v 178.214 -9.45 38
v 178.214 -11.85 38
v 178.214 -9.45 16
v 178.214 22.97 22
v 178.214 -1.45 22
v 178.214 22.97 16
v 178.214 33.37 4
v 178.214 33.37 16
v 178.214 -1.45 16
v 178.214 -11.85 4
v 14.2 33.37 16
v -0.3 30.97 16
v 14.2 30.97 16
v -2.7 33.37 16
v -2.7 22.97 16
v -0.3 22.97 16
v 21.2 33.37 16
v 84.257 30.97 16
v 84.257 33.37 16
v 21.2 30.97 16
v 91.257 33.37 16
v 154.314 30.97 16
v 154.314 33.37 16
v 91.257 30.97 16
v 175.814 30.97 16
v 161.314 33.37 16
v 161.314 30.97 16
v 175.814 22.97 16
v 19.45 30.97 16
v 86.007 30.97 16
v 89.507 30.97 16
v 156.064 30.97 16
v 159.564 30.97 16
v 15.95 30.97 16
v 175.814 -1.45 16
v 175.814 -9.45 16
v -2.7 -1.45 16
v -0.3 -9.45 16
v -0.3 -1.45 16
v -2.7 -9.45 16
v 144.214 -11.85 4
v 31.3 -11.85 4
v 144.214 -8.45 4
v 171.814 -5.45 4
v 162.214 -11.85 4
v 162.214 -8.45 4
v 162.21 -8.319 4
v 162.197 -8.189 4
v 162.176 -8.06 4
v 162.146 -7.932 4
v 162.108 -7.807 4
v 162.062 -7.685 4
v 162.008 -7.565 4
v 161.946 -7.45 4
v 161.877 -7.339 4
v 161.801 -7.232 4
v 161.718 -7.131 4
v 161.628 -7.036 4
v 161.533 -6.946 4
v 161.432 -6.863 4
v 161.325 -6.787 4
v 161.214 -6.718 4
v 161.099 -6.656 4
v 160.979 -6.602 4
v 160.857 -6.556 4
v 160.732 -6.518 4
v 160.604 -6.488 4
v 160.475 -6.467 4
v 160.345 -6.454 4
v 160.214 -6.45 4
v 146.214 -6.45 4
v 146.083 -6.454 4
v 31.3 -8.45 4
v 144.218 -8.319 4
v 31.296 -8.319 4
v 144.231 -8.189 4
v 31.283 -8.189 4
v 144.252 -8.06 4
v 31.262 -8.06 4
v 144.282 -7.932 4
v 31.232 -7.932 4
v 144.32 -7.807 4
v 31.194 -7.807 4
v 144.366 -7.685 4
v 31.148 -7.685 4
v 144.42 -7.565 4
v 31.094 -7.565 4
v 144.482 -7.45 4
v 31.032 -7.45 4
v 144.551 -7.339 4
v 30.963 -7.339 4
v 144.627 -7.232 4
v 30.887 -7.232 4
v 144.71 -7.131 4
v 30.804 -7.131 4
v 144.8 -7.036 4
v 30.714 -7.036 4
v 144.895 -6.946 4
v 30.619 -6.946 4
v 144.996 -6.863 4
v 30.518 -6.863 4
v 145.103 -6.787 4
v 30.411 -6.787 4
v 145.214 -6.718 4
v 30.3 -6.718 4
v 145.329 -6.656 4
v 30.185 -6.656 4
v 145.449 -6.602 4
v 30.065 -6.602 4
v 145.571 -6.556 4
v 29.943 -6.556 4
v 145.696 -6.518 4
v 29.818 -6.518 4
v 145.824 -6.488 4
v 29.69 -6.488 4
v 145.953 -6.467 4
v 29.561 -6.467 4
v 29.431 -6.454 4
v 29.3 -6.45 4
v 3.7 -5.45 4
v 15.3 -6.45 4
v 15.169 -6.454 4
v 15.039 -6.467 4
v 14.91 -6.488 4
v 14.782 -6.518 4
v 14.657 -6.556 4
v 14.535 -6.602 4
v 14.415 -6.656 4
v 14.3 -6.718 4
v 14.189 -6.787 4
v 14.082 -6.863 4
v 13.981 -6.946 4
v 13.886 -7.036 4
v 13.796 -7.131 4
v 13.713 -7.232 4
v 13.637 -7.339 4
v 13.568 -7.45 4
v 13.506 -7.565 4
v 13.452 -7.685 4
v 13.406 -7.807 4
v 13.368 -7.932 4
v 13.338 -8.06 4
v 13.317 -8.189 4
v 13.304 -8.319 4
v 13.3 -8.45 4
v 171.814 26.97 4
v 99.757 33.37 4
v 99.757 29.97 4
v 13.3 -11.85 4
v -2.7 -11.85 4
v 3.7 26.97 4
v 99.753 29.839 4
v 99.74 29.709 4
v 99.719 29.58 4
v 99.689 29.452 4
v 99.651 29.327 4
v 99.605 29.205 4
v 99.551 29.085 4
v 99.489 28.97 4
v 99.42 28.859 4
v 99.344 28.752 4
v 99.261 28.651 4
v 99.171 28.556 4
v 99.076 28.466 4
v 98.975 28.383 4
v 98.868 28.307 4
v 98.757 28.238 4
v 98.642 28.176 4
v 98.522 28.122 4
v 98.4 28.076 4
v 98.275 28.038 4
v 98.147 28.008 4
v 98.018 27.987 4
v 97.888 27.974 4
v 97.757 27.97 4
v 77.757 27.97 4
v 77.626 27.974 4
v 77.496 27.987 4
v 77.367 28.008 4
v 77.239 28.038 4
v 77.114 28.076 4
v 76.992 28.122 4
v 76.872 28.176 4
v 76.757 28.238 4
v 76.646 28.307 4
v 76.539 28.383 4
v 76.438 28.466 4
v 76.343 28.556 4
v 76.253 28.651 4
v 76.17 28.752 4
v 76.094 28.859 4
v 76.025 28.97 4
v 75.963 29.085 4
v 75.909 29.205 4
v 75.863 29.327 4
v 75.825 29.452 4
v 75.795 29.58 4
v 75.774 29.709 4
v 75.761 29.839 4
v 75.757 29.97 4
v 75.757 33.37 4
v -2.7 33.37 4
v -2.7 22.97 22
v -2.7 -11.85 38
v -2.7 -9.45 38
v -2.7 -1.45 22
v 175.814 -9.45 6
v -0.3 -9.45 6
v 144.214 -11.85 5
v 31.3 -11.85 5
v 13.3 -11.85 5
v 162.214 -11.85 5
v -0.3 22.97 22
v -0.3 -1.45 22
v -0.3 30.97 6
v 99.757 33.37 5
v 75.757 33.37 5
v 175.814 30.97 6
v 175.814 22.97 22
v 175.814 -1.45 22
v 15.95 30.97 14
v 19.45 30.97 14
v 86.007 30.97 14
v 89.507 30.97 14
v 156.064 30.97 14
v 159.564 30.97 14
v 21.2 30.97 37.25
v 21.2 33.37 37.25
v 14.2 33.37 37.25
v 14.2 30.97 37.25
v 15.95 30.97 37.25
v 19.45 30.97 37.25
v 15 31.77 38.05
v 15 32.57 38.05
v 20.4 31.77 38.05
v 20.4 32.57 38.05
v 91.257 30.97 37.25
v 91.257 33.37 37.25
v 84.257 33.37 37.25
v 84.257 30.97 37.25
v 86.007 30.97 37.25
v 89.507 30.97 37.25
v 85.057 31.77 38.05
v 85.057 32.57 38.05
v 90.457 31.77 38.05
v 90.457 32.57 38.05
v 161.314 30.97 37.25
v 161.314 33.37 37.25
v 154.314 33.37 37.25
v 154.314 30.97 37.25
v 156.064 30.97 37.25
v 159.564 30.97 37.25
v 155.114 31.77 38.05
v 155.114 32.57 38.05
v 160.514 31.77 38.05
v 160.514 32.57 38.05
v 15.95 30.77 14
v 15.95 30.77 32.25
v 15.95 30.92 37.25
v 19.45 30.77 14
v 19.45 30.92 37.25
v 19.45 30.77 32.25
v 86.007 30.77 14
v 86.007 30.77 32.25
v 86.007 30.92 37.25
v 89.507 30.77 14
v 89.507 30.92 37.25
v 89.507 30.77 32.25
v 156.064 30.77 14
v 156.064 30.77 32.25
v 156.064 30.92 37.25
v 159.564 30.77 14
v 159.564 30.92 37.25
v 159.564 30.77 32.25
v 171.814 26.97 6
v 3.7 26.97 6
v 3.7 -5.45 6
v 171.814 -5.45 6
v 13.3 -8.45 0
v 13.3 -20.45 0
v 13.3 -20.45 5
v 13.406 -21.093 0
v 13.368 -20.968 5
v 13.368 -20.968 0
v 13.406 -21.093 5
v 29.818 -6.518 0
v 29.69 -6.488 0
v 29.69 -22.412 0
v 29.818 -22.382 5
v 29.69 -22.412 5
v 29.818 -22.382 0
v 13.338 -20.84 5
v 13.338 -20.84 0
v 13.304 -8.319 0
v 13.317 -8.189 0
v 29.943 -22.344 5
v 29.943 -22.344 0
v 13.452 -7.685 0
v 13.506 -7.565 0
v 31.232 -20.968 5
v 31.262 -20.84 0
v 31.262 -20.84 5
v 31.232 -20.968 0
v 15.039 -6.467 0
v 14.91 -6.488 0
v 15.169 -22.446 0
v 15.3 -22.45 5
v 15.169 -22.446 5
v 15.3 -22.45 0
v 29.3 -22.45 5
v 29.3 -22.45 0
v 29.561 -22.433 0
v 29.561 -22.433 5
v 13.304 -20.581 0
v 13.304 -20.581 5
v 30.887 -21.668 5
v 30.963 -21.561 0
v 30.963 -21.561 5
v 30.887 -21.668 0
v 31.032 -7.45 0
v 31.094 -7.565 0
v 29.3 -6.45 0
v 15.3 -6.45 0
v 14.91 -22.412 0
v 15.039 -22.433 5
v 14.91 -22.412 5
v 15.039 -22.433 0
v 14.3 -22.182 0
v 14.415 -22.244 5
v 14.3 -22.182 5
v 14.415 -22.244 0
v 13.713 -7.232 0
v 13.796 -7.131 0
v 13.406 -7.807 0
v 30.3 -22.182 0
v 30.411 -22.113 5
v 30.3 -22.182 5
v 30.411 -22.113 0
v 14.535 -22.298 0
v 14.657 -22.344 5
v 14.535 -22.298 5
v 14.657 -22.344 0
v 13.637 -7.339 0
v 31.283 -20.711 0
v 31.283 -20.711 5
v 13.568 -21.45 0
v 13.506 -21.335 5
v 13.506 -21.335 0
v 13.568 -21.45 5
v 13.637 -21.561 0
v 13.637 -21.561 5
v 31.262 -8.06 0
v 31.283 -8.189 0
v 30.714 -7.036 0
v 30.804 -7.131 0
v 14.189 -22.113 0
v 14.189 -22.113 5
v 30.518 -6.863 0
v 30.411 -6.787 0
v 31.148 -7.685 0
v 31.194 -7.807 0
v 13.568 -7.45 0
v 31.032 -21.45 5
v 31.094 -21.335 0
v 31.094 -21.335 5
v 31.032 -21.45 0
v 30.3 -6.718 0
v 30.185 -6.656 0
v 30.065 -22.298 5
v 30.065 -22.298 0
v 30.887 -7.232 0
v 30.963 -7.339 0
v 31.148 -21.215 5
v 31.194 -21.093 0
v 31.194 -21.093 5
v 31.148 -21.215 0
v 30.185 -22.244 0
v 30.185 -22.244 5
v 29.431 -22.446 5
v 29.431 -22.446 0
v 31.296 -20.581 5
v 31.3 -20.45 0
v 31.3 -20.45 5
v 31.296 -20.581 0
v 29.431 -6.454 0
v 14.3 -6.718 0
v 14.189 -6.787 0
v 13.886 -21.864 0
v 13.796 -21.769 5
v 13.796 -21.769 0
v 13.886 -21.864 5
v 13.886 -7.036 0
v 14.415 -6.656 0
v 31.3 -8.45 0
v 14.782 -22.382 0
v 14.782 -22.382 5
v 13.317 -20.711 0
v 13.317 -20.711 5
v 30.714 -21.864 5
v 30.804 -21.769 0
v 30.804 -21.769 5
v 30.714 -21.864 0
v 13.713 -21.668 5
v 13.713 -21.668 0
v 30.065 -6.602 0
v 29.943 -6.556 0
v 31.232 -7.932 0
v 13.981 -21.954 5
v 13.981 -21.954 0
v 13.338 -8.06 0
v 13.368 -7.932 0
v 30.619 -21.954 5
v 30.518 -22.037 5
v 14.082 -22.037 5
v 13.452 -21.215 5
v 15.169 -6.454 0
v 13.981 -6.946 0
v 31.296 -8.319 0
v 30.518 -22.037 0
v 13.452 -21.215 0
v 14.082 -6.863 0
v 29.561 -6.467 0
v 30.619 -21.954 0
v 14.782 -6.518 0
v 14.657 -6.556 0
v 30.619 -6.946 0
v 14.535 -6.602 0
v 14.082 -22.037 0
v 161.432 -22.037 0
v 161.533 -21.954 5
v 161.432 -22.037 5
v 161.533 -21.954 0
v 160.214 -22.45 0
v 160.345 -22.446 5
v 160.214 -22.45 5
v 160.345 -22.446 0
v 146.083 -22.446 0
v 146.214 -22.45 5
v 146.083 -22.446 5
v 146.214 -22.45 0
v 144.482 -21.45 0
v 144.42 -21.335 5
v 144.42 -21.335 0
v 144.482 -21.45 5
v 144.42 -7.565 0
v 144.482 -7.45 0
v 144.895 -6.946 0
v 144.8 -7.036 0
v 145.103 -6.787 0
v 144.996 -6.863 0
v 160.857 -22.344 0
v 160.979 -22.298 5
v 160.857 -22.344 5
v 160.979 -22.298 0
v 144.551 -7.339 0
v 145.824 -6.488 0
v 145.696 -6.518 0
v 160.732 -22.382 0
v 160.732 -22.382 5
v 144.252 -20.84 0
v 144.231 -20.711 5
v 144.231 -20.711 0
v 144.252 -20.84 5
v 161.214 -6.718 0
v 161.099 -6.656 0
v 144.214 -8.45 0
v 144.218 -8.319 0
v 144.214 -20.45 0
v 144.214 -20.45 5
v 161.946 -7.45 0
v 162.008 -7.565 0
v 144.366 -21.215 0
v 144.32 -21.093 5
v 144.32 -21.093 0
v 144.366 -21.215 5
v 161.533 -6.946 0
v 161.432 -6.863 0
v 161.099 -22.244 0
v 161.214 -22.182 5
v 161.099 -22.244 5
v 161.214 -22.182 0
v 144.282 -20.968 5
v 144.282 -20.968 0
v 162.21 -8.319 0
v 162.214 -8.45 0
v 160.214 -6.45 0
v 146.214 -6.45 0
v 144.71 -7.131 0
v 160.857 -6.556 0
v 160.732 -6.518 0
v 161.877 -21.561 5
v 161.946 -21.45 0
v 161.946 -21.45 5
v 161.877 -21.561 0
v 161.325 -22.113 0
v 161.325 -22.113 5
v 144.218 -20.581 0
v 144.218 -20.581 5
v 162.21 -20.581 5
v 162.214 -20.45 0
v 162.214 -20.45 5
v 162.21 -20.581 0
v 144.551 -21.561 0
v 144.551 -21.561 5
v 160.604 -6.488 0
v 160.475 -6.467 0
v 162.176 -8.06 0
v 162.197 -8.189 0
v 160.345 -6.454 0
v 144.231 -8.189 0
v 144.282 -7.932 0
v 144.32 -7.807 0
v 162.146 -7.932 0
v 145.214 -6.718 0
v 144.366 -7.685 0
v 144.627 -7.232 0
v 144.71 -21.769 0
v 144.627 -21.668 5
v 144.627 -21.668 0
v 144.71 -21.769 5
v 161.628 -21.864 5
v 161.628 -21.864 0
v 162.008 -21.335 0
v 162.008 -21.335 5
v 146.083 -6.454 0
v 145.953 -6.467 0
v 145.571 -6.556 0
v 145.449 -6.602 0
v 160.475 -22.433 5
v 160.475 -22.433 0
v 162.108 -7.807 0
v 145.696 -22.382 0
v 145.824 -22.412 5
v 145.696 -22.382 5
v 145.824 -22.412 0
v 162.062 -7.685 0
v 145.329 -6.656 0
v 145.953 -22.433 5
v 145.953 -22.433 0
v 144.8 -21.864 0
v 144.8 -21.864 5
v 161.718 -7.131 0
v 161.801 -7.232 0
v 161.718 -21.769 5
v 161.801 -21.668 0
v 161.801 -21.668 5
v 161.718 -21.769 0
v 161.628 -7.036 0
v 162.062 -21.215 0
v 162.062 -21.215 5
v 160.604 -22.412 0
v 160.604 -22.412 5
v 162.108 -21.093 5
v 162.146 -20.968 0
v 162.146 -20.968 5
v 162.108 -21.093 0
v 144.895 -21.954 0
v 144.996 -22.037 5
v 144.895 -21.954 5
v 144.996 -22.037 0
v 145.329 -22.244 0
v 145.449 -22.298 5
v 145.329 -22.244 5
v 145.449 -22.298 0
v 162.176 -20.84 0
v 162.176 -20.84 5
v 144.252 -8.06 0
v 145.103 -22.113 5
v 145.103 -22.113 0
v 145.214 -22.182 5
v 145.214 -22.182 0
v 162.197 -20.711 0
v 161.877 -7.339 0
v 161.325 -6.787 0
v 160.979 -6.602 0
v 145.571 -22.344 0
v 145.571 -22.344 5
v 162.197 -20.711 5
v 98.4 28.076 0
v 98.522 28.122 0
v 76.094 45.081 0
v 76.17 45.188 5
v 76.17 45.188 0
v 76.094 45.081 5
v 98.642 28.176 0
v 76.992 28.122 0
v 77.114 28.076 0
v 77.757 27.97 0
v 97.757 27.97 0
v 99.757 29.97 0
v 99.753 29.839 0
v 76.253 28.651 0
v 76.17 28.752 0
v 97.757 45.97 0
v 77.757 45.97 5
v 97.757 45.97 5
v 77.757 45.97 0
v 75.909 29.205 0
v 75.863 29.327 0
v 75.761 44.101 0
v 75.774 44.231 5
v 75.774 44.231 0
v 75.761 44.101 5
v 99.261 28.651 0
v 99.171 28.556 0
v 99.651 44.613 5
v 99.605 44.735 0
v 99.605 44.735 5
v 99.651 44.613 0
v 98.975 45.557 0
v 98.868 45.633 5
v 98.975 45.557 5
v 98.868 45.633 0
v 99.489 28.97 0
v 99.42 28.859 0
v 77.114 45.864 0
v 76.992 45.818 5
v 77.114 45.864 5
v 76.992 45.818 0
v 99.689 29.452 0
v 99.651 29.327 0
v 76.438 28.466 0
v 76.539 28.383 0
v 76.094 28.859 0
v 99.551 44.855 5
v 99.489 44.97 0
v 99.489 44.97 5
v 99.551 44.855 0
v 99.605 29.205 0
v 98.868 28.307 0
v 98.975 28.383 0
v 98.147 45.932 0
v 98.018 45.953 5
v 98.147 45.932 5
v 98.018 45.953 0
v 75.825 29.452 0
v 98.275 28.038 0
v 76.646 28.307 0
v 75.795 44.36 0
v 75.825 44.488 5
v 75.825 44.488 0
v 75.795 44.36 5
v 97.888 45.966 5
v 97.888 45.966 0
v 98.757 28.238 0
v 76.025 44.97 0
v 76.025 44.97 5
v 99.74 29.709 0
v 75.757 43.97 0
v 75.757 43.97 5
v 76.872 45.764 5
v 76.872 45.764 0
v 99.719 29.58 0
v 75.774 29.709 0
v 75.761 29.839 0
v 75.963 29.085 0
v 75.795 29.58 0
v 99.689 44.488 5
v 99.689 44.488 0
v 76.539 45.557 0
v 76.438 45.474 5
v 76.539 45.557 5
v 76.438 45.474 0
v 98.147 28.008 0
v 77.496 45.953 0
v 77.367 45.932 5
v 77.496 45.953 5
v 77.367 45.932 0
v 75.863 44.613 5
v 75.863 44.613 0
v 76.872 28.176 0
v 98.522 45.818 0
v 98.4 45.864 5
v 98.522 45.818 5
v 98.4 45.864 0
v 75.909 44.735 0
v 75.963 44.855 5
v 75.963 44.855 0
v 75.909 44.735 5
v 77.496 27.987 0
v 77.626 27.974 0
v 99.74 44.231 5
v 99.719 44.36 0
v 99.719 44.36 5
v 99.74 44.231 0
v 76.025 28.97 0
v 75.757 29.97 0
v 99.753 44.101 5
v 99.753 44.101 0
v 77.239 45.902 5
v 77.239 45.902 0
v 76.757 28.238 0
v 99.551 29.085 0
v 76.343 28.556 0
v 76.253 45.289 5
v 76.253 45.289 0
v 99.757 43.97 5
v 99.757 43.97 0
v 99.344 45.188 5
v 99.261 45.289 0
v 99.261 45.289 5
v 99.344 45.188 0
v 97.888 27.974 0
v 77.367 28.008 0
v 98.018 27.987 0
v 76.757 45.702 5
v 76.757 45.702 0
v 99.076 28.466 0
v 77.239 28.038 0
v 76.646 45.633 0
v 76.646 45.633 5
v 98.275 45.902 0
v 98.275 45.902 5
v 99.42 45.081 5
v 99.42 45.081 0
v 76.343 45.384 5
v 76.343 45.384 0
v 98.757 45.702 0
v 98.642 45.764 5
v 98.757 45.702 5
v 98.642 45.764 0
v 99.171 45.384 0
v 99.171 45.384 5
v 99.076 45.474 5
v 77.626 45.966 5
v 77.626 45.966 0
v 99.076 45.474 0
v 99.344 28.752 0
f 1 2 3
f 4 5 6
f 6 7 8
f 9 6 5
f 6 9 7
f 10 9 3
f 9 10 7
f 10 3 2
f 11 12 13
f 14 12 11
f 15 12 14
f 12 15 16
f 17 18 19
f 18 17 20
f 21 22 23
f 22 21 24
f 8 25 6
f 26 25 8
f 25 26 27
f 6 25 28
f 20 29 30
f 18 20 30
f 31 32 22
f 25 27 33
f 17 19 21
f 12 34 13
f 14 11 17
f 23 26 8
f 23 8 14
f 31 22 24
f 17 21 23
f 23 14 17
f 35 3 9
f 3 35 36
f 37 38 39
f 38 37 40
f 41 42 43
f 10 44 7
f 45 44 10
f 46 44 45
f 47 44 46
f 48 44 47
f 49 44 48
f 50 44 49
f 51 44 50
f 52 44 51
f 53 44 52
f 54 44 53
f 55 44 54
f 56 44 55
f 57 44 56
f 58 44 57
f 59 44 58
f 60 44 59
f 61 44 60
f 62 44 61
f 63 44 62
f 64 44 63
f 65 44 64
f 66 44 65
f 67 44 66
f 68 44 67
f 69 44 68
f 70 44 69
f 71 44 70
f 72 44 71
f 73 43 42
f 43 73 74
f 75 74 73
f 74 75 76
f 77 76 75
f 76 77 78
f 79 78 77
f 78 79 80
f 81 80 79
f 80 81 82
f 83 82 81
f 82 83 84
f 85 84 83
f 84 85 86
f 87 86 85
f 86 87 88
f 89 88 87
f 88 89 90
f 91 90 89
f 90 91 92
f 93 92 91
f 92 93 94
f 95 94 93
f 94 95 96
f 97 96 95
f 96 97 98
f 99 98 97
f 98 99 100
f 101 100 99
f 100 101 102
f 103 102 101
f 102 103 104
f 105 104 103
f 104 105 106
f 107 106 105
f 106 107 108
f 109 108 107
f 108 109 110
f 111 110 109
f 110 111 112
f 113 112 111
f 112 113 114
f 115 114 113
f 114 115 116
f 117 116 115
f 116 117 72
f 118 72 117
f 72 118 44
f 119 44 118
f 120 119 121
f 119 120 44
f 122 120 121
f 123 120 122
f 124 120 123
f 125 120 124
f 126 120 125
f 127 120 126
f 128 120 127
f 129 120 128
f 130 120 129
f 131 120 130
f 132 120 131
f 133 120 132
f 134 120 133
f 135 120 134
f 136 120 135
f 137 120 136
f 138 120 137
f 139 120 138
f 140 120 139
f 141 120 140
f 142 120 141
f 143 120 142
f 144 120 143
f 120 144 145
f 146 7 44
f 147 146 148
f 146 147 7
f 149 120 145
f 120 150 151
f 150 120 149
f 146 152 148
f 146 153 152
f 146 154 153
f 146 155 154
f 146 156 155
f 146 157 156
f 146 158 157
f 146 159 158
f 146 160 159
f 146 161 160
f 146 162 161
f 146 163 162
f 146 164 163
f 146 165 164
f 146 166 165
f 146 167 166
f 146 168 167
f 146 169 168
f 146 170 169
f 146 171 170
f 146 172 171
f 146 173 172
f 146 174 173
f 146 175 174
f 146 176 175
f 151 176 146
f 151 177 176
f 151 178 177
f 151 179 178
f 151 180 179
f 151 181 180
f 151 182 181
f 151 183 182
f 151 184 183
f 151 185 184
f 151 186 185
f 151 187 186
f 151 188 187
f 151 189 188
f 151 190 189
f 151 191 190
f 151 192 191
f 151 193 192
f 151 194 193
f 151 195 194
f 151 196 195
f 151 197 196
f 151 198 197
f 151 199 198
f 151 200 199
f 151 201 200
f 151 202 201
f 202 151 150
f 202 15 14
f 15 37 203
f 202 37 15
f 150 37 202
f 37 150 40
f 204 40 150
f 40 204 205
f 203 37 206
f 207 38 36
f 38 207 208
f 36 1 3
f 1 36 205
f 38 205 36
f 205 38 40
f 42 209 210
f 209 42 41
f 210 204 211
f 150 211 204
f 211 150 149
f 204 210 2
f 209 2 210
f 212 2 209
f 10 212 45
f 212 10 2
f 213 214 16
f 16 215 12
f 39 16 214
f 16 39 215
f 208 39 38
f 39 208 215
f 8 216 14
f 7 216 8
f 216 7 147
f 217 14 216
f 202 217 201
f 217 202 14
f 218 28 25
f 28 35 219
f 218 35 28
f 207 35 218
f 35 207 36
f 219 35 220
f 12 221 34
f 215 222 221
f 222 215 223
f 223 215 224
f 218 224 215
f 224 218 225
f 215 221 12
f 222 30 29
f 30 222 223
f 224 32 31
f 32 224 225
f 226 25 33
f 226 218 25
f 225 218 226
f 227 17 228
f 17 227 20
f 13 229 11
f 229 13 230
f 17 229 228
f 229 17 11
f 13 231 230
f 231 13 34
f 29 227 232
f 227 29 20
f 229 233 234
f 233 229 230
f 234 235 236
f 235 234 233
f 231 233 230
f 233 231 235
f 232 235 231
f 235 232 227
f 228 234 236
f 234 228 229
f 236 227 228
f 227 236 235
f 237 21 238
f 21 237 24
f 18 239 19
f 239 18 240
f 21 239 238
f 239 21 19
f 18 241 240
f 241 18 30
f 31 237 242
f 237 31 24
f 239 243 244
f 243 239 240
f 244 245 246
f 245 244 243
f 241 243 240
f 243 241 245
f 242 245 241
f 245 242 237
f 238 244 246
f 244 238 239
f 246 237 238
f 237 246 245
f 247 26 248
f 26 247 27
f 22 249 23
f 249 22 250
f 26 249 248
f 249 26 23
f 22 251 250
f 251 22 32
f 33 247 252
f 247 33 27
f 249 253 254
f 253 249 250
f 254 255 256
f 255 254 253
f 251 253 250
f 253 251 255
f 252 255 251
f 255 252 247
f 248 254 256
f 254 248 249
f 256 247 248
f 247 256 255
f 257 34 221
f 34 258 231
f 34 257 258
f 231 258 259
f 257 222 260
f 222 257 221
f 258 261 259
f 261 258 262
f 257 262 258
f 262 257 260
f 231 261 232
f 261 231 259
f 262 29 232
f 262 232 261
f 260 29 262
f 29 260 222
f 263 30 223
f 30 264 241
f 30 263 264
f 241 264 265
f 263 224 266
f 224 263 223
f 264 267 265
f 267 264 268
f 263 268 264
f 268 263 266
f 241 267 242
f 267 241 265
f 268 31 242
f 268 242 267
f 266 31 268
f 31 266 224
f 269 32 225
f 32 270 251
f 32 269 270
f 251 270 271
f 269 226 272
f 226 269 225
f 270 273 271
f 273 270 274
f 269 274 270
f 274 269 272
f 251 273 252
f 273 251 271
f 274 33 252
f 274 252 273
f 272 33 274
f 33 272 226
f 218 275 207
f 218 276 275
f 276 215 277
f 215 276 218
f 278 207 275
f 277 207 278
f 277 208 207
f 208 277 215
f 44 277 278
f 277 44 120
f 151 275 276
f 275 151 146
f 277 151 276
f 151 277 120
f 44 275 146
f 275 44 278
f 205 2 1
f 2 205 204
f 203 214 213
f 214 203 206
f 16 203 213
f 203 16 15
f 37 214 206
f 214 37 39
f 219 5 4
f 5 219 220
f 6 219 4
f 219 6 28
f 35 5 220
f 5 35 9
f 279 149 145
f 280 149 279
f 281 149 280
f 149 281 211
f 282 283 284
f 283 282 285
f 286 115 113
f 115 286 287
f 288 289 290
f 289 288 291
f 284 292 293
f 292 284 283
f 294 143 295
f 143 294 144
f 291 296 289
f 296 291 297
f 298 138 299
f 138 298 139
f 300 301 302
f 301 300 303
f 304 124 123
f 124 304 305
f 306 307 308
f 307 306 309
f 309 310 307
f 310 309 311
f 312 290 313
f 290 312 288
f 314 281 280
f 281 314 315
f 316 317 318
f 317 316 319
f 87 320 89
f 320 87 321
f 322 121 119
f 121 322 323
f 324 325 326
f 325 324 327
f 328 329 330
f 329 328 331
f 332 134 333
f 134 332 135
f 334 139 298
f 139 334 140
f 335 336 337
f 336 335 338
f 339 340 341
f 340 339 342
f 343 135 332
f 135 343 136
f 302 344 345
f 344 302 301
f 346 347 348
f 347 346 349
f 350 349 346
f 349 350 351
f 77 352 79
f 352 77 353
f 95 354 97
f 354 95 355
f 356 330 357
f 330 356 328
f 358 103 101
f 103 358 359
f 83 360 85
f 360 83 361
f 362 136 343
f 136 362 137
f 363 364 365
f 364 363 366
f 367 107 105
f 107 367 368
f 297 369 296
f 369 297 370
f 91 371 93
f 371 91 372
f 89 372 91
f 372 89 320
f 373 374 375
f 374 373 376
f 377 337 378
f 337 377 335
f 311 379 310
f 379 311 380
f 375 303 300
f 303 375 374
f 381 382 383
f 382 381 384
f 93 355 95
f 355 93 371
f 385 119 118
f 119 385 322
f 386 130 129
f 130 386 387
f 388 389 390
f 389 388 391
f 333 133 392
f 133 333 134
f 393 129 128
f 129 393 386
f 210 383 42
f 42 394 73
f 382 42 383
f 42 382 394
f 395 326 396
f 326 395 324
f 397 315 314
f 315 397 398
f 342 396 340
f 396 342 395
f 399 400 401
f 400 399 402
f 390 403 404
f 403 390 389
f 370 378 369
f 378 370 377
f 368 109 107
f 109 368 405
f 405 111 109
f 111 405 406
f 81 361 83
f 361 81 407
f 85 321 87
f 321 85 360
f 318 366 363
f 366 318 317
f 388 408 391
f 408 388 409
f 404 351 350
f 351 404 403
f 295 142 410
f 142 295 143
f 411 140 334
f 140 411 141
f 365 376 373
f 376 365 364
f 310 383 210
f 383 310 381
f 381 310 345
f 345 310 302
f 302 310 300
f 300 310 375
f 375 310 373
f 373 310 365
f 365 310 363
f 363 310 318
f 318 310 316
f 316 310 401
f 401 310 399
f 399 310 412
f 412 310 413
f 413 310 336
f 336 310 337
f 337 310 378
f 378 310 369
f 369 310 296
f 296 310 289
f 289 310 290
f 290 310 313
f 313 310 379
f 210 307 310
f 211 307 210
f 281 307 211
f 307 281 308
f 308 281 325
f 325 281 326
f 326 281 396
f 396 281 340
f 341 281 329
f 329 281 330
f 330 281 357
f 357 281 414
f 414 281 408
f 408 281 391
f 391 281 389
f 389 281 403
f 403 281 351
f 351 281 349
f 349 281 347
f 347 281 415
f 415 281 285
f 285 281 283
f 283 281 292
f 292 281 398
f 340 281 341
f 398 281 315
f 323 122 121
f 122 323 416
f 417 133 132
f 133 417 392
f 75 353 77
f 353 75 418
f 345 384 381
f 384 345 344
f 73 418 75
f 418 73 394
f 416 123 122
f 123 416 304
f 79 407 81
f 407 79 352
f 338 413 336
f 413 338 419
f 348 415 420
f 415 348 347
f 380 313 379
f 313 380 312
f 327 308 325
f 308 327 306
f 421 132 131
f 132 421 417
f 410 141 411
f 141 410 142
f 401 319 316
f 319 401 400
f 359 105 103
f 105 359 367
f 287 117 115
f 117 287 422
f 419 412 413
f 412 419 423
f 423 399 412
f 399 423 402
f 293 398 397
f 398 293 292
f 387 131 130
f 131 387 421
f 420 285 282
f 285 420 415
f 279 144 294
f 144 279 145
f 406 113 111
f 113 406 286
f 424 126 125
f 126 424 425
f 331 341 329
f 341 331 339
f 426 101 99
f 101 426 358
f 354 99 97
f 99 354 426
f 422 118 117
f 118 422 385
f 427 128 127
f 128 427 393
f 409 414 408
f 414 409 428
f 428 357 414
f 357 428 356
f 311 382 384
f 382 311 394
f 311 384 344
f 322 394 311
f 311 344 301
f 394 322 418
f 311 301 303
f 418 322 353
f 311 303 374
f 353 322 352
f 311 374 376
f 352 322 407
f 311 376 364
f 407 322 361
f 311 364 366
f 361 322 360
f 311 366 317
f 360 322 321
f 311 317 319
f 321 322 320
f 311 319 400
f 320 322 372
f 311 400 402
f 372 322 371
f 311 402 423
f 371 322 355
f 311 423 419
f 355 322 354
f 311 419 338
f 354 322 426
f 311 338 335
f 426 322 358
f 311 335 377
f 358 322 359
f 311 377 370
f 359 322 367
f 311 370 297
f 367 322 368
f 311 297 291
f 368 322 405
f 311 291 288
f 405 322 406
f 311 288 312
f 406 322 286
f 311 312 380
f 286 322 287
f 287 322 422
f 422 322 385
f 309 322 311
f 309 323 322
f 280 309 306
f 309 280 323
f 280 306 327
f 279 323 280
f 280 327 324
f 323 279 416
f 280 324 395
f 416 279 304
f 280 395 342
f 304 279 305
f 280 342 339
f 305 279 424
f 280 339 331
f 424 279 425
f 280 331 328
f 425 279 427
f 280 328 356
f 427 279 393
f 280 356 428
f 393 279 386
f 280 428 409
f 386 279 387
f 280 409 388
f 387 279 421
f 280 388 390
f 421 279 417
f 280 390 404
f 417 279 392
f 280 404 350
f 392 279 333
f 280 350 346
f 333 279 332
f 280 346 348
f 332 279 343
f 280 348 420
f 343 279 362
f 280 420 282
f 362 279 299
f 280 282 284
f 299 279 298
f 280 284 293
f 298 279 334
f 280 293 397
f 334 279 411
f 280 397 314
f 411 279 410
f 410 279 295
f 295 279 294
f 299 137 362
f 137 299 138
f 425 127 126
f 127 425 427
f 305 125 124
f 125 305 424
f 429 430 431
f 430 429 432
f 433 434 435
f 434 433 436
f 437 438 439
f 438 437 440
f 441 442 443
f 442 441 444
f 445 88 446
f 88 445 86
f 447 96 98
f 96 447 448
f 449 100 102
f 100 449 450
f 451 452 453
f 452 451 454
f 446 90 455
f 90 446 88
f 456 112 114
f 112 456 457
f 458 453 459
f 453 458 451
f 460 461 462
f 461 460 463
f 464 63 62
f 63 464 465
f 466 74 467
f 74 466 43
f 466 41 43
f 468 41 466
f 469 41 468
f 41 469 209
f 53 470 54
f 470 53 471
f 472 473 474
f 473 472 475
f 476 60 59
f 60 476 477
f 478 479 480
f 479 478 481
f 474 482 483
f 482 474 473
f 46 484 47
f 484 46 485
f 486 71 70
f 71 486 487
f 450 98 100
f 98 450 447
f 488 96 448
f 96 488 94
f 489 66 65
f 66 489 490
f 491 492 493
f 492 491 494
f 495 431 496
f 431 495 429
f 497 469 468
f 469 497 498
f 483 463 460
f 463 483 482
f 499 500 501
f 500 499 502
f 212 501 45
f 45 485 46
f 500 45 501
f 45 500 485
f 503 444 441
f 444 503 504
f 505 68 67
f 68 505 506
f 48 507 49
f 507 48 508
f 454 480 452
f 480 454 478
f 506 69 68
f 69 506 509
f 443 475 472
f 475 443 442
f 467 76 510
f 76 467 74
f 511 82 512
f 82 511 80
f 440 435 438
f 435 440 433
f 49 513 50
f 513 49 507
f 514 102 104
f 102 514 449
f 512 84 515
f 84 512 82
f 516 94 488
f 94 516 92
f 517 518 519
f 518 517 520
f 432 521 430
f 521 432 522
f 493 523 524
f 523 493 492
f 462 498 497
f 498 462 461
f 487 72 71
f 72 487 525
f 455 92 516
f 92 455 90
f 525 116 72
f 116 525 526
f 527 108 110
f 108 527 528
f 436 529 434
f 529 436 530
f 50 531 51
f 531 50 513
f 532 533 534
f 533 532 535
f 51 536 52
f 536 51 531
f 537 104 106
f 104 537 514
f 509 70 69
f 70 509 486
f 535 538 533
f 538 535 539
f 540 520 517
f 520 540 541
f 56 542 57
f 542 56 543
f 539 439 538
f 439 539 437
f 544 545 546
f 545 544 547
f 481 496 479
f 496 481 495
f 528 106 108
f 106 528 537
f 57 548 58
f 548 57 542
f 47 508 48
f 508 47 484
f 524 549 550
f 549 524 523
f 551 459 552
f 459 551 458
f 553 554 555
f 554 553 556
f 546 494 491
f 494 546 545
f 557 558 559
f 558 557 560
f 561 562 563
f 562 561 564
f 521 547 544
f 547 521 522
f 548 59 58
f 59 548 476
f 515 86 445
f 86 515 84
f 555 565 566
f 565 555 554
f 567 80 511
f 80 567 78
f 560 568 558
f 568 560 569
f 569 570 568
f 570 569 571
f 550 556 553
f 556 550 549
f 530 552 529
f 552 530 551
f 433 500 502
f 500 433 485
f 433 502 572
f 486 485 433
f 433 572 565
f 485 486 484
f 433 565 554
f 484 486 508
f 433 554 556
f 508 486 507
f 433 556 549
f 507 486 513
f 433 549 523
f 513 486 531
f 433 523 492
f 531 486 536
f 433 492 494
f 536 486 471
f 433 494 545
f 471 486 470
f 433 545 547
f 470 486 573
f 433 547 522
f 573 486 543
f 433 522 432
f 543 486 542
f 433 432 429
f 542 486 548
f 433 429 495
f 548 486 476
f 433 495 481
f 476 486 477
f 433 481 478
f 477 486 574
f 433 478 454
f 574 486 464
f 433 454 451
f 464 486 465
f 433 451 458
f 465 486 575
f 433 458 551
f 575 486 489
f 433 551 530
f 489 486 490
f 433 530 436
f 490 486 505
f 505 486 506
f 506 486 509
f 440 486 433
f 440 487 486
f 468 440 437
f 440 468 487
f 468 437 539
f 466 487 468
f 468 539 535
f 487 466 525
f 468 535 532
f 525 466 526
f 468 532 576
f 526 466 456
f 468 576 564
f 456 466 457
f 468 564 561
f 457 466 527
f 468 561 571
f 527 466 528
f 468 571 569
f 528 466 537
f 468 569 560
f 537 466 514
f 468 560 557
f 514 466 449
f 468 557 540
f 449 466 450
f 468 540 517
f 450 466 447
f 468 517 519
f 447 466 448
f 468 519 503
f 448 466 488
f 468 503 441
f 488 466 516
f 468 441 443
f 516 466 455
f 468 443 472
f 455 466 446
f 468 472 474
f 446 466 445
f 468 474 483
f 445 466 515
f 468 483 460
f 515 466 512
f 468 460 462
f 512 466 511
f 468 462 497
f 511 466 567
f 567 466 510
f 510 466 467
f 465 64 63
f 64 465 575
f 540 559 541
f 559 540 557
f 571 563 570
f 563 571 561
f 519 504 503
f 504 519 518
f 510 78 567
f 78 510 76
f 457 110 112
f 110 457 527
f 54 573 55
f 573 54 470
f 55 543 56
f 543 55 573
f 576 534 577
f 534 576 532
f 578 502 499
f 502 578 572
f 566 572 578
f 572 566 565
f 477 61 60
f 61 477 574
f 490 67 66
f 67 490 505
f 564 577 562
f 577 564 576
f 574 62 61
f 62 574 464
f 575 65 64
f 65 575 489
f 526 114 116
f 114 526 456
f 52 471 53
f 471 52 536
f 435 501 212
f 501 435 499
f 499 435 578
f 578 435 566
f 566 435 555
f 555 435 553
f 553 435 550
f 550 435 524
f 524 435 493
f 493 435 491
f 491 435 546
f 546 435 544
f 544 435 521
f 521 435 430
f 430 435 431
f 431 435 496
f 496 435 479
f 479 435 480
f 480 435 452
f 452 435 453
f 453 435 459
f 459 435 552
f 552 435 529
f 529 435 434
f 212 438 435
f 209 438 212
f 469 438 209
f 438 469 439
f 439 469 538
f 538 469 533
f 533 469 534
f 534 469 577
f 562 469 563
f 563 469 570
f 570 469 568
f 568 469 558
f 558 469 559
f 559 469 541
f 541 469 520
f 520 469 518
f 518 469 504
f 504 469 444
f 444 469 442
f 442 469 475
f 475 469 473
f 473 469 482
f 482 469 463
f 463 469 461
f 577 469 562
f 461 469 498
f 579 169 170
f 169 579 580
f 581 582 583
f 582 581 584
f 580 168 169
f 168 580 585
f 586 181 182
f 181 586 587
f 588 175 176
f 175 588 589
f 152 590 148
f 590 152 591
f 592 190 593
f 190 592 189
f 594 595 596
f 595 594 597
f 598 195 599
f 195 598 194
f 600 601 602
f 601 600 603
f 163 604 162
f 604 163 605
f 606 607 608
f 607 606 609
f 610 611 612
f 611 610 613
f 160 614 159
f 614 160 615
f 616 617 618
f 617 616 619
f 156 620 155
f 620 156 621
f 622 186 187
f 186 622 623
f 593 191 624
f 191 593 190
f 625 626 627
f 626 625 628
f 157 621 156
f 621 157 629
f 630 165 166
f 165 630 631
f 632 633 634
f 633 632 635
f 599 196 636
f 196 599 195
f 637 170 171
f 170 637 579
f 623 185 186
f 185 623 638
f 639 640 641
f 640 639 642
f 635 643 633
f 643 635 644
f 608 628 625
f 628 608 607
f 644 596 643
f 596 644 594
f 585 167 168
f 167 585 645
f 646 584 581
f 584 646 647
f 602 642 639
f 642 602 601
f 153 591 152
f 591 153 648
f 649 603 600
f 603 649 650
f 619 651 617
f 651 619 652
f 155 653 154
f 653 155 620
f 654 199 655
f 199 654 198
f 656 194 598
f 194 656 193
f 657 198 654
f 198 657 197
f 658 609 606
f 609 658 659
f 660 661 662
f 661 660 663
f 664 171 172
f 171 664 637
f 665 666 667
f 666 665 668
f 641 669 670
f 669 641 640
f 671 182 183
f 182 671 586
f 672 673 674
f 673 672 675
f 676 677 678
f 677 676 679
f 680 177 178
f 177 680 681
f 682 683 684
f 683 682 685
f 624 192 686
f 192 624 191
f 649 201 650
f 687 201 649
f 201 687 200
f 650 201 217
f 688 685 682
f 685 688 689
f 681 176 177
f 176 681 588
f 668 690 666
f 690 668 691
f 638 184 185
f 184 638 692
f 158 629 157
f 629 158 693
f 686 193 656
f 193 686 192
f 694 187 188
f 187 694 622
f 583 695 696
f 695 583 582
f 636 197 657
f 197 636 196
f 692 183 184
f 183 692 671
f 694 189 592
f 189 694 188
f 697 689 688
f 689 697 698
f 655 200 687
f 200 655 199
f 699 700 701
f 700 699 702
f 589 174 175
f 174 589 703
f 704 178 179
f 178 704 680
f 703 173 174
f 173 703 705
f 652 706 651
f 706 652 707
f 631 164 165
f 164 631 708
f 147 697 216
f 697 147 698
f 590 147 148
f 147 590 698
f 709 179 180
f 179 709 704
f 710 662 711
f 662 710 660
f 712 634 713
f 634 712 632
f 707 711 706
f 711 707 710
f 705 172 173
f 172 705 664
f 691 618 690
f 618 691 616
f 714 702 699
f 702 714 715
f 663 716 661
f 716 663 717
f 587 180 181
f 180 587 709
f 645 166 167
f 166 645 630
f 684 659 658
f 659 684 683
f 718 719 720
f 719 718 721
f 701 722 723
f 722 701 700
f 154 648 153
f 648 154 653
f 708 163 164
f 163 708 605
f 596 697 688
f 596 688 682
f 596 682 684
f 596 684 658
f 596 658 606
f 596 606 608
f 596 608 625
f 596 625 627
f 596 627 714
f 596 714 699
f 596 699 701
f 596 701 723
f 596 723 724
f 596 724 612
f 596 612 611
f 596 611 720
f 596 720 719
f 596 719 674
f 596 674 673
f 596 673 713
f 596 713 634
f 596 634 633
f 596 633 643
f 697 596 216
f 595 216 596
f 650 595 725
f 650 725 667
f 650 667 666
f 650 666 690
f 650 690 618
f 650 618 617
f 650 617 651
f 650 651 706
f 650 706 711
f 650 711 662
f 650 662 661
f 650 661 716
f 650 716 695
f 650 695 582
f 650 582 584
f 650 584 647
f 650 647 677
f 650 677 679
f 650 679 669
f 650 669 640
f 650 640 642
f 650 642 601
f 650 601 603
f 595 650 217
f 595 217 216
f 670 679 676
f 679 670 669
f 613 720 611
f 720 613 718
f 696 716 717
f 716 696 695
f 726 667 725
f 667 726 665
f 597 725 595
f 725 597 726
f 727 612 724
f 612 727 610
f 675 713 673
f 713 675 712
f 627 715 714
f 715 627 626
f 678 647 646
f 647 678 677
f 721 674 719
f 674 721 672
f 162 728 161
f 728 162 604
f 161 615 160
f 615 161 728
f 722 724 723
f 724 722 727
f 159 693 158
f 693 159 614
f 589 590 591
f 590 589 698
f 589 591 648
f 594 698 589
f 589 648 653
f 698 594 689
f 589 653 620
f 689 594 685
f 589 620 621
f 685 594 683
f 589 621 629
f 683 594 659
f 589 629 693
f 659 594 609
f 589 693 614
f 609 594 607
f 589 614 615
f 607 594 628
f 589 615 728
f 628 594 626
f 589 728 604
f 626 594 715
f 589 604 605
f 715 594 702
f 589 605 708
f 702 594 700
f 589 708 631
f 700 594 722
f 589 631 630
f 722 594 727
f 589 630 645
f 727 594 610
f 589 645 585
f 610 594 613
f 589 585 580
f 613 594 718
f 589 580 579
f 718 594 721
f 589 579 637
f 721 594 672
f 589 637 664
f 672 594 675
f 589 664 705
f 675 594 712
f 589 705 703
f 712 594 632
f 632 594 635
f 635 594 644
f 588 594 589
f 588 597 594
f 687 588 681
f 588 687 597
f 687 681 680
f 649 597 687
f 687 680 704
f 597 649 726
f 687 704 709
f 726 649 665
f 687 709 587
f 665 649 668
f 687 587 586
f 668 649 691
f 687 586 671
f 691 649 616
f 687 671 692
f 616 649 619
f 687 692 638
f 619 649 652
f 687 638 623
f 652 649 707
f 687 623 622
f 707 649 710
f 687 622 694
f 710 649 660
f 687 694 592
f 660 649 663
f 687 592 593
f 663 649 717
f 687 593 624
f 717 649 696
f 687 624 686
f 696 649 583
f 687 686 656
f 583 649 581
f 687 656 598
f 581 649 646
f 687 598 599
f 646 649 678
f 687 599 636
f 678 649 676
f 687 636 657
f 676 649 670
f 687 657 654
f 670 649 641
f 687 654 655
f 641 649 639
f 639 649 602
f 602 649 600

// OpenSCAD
// DOUBLE TAKE FRAMES DESIGN RELEASE
// DTF_RELEASE: 3.0.0
// Released: 2026-09-24
// Versioning: Semantic Versioning 2.0.0 (https://semver.org/)
// Status: CANONICAL
// Changes in 3.0.0:
// - Carried forward unchanged for the clipless keyed wall-rig and latch release.
// Changes in 2.0.4:
// - Carried forward unchanged for the coordinated capstan and clock-string-guide release.
// Changes in 2.0.3:
// - Carried forward unchanged for the corrected prepared-project packaging.
// Changes in 2.0.2:
// - Carried forward unchanged for the native 3MF packaging hotfix.
// Changes in 2.0.1:
// - Carried forward unchanged for the prepared-project packaging correction.
// Changes in 2.0.0:
// - Carried forward without geometry changes for the coordinated 2.0.0 release.
// Full release notes: https://doubletakeframes.com/build/#design-release
//
$fn = 96;
eps = 0.05;

// =========================================================
// DETACHABLE FRONT BAND + SIDE WALLS + REAR POSTS + FEETS
// Continuous low rail all around.
// Side walls sit on rail but do not connect to front/back above rail.
// Non-friction resting fit.
//
// Corrected:
// - Feet overlap collar/body in Z by foot_body_z_overlap, not just eps.
// - Each foot is shifted a few mm inward under the basket while keeping
//   the original front/rear foot depth.
// =========================================================

inch = 25.4;

// CASSETTE REFERENCE VALUES
cassette_w = 6.91 * inch;

bottom_t    = 3.0;
wall_t      = 3.0;
wall_offset = 0.0;

front_frame_t    = 1.2;
acrylic_gap      = 1.0;
spacer_thickness = 7.0;

front_buildout_total = front_frame_t + acrylic_gap + spacer_thickness;
front_buildout_y0    = wall_offset - front_buildout_total;

roller_r    = 0.75 * inch;
glide_t     = 2.0;
fang_embed  = 0.6;
rail_back_y = 8.0;
roller_cy   = wall_offset + wall_t;

glide_y  = roller_cy + roller_r - glide_t - fang_embed;
bottom_d = glide_y + glide_t + rail_back_y;

backing_board_extra_y = 1/20 * inch;

cassette_x0 = 0;
cassette_x1 = cassette_w;
cassette_y0 = front_buildout_y0;
cassette_y1 = bottom_d + backing_board_extra_y;

// FIT / GEOMETRY
clear_x = 0.3;
clear_y = 0.25;

collar_t = 2.4;

foot_h = 5.0;
foot_body_z_overlap = 1.0;
collar_z0 = foot_h - foot_body_z_overlap;

collar_h = 34.0;
side_wall_h = 18.0;
inner_x0 = cassette_x0 - clear_x;
inner_x1 = cassette_x1 + clear_x;
inner_y0 = cassette_y0 - clear_y;
inner_y1 = cassette_y1 + clear_y;

outer_x0 = inner_x0 - collar_t;
outer_x1 = inner_x1 + collar_t;
outer_y0 = inner_y0 - collar_t;
outer_y1 = inner_y1 + collar_t;

// RESTING LEDGE
rest_lip_t = 4.0;
rest_lip_h = 2.0;

// LOW RAIL
low_rail_h = 12.0;

// SIDE WALLS
side_wall_gap_front = 8.0;
side_wall_gap_rear  = 8.0;
side_wall_t = collar_t;

// REAR POSTS
rear_post_w = 7.0;
rear_post_t = collar_t;
post_bevel = 0.8;

// Localized friction take-up on the three rear backing-board capture posts.
// These project into the existing Y clearance without moving the posts or
// tightening the stand's overall envelope. The upper ramp eases insertion.
rear_post_friction_pad_d = 0.20;
rear_post_friction_pad_w = 3.5;
rear_post_friction_pad_z0 = collar_z0 + low_rail_h - 2.0;
rear_post_friction_pad_z1 = collar_z0 + collar_h - post_bevel;
rear_post_friction_ramp_h = 5.0;

// FEET
front_foot_proj = 16.0;
rear_foot_proj  = 18.0;

front_foot_w = 18.0;
rear_foot_w  = 24.0;

front_foot_inset_x = 16.0;
foot_round = 2.0;

// How far the inner edge of each foot reaches under the basket.
// Original effectively stopped ~0.6 mm short of the inner edge.
foot_y_overlap = 3.0;

// HELPERS
module rounded_rect_prism(x0, x1, y0, y1, z0, z1, r=2) {
    hull() {
        translate([x0+r, y0+r, z0]) cylinder(r=r, h=z1-z0);
        translate([x1-r, y0+r, z0]) cylinder(r=r, h=z1-z0);
        translate([x0+r, y1-r, z0]) cylinder(r=r, h=z1-z0);
        translate([x1-r, y1-r, z0]) cylinder(r=r, h=z1-z0);
    }
}

module beveled_post(xsz, ysz, h, b) {
    bx = min(b, xsz/2 - eps);
    by = min(b, ysz/2 - eps);

    union() {
        cube([xsz, ysz, h - b]);

        translate([0, 0, h - b])
        hull() {
            cube([xsz, ysz, eps]);

            translate([bx, by, b])
                cube([
                    max(eps, xsz - 2*bx),
                    max(eps, ysz - 2*by),
                    eps
                ]);
        }
    }
}

// FRONT BAND
module front_band() {
    translate([outer_x0, outer_y0, collar_z0])
        cube([
            outer_x1 - outer_x0,
            collar_t,
            collar_h
        ]);
}

// CONTINUOUS LOW RAIL
module front_low_rail() {
    translate([outer_x0, outer_y0, collar_z0])
        cube([outer_x1 - outer_x0, collar_t, low_rail_h]);
}

module left_low_rail() {
    translate([outer_x0, outer_y0, collar_z0])
        cube([collar_t, outer_y1 - outer_y0, low_rail_h]);
}

module right_low_rail() {
    translate([outer_x1 - collar_t, outer_y0, collar_z0])
        cube([collar_t, outer_y1 - outer_y0, low_rail_h]);
}

module rear_low_rail() {
    translate([outer_x0, outer_y1 - collar_t, collar_z0])
        cube([outer_x1 - outer_x0, collar_t, low_rail_h]);
}

module low_rails() {
    // front rail overlaps lower part of front band; harmless and strengthens base
    front_low_rail();
    left_low_rail();
    right_low_rail();
    rear_low_rail();
}

// SIDE WALLS
module left_side_wall() {
    y0 = inner_y0 + side_wall_gap_front;
    y1 = inner_y1 - side_wall_gap_rear;

    translate([outer_x0, y0, collar_z0])
        cube([
            side_wall_t,
            y1 - y0,
            side_wall_h
        ]);
}

module right_side_wall() {
    y0 = inner_y0 + side_wall_gap_front;
    y1 = inner_y1 - side_wall_gap_rear;

    translate([inner_x1, y0, collar_z0])
        cube([
            side_wall_t,
            y1 - y0,
            side_wall_h
        ]);
}

// REAR POSTS
module rear_post(x_center) {
    translate([x_center - rear_post_w/2, inner_y1, collar_z0])
        beveled_post(rear_post_w, rear_post_t, collar_h, post_bevel);
}

module rear_post_friction_pad(x_center) {
    pad_x0 = x_center - rear_post_friction_pad_w/2;
    full_pad_y0 = inner_y1 - rear_post_friction_pad_d;
    ramp_z0 = rear_post_friction_pad_z1 - rear_post_friction_ramp_h;

    hull() {
        translate([pad_x0, full_pad_y0, rear_post_friction_pad_z0])
            cube([rear_post_friction_pad_w, rear_post_friction_pad_d + eps, eps]);
        translate([pad_x0, full_pad_y0, ramp_z0])
            cube([rear_post_friction_pad_w, rear_post_friction_pad_d + eps, eps]);
        translate([pad_x0, inner_y1 - eps, rear_post_friction_pad_z1])
            cube([rear_post_friction_pad_w, 2*eps, eps]);
    }
}

module rear_posts() {
    left_post_x = inner_x0 + 18.0;
    center_post_x = (inner_x0 + inner_x1) / 2;
    right_post_x = inner_x1 - 18.0;

    rear_post(left_post_x);
    rear_post(center_post_x);
    rear_post(right_post_x);

    rear_post_friction_pad(left_post_x);
    rear_post_friction_pad(center_post_x);
    rear_post_friction_pad(right_post_x);
}

// BOTTOM RESTING LEDGE
module bottom_rest_lip() {
    translate([inner_x0, inner_y0, collar_z0])
        cube([inner_x1 - inner_x0, rest_lip_t, rest_lip_h]);

    translate([inner_x0, inner_y1 - rest_lip_t, collar_z0])
        cube([inner_x1 - inner_x0, rest_lip_t, rest_lip_h]);

    translate([inner_x0, inner_y0, collar_z0])
        cube([rest_lip_t, inner_y1 - inner_y0, rest_lip_h]);

    translate([inner_x1 - rest_lip_t, inner_y0, collar_z0])
        cube([rest_lip_t, inner_y1 - inner_y0, rest_lip_h]);
}

// FEET
module front_left_foot() {
    x0 = outer_x0 + front_foot_inset_x;
    x1 = x0 + front_foot_w;

    // Same foot depth as original, shifted inward for a few mm of underlap.
    y1 = inner_y0 + foot_y_overlap;
    y0 = y1 - front_foot_proj;

    rounded_rect_prism(x0, x1, y0, y1, 0, foot_h, foot_round);
}

module front_right_foot() {
    x1 = outer_x1 - front_foot_inset_x;
    x0 = x1 - front_foot_w;

    // Same foot depth as original, shifted inward for a few mm of underlap.
    y1 = inner_y0 + foot_y_overlap;
    y0 = y1 - front_foot_proj;

    rounded_rect_prism(x0, x1, y0, y1, 0, foot_h, foot_round);
}

module rear_center_foot() {
    x0 = (outer_x0 + outer_x1)/2 - rear_foot_w/2;
    x1 = x0 + rear_foot_w;

    // Same foot depth as original, shifted inward for a few mm of underlap.
    y0 = inner_y1 - foot_y_overlap;
    y1 = y0 + rear_foot_proj;

    rounded_rect_prism(x0, x1, y0, y1, 0, foot_h, foot_round);
}

// FINAL
union() {
    front_band();
    low_rails();

    left_side_wall();
    right_side_wall();
    rear_posts();

    bottom_rest_lip();

    front_left_foot();
    front_right_foot();
    rear_center_foot();
}
